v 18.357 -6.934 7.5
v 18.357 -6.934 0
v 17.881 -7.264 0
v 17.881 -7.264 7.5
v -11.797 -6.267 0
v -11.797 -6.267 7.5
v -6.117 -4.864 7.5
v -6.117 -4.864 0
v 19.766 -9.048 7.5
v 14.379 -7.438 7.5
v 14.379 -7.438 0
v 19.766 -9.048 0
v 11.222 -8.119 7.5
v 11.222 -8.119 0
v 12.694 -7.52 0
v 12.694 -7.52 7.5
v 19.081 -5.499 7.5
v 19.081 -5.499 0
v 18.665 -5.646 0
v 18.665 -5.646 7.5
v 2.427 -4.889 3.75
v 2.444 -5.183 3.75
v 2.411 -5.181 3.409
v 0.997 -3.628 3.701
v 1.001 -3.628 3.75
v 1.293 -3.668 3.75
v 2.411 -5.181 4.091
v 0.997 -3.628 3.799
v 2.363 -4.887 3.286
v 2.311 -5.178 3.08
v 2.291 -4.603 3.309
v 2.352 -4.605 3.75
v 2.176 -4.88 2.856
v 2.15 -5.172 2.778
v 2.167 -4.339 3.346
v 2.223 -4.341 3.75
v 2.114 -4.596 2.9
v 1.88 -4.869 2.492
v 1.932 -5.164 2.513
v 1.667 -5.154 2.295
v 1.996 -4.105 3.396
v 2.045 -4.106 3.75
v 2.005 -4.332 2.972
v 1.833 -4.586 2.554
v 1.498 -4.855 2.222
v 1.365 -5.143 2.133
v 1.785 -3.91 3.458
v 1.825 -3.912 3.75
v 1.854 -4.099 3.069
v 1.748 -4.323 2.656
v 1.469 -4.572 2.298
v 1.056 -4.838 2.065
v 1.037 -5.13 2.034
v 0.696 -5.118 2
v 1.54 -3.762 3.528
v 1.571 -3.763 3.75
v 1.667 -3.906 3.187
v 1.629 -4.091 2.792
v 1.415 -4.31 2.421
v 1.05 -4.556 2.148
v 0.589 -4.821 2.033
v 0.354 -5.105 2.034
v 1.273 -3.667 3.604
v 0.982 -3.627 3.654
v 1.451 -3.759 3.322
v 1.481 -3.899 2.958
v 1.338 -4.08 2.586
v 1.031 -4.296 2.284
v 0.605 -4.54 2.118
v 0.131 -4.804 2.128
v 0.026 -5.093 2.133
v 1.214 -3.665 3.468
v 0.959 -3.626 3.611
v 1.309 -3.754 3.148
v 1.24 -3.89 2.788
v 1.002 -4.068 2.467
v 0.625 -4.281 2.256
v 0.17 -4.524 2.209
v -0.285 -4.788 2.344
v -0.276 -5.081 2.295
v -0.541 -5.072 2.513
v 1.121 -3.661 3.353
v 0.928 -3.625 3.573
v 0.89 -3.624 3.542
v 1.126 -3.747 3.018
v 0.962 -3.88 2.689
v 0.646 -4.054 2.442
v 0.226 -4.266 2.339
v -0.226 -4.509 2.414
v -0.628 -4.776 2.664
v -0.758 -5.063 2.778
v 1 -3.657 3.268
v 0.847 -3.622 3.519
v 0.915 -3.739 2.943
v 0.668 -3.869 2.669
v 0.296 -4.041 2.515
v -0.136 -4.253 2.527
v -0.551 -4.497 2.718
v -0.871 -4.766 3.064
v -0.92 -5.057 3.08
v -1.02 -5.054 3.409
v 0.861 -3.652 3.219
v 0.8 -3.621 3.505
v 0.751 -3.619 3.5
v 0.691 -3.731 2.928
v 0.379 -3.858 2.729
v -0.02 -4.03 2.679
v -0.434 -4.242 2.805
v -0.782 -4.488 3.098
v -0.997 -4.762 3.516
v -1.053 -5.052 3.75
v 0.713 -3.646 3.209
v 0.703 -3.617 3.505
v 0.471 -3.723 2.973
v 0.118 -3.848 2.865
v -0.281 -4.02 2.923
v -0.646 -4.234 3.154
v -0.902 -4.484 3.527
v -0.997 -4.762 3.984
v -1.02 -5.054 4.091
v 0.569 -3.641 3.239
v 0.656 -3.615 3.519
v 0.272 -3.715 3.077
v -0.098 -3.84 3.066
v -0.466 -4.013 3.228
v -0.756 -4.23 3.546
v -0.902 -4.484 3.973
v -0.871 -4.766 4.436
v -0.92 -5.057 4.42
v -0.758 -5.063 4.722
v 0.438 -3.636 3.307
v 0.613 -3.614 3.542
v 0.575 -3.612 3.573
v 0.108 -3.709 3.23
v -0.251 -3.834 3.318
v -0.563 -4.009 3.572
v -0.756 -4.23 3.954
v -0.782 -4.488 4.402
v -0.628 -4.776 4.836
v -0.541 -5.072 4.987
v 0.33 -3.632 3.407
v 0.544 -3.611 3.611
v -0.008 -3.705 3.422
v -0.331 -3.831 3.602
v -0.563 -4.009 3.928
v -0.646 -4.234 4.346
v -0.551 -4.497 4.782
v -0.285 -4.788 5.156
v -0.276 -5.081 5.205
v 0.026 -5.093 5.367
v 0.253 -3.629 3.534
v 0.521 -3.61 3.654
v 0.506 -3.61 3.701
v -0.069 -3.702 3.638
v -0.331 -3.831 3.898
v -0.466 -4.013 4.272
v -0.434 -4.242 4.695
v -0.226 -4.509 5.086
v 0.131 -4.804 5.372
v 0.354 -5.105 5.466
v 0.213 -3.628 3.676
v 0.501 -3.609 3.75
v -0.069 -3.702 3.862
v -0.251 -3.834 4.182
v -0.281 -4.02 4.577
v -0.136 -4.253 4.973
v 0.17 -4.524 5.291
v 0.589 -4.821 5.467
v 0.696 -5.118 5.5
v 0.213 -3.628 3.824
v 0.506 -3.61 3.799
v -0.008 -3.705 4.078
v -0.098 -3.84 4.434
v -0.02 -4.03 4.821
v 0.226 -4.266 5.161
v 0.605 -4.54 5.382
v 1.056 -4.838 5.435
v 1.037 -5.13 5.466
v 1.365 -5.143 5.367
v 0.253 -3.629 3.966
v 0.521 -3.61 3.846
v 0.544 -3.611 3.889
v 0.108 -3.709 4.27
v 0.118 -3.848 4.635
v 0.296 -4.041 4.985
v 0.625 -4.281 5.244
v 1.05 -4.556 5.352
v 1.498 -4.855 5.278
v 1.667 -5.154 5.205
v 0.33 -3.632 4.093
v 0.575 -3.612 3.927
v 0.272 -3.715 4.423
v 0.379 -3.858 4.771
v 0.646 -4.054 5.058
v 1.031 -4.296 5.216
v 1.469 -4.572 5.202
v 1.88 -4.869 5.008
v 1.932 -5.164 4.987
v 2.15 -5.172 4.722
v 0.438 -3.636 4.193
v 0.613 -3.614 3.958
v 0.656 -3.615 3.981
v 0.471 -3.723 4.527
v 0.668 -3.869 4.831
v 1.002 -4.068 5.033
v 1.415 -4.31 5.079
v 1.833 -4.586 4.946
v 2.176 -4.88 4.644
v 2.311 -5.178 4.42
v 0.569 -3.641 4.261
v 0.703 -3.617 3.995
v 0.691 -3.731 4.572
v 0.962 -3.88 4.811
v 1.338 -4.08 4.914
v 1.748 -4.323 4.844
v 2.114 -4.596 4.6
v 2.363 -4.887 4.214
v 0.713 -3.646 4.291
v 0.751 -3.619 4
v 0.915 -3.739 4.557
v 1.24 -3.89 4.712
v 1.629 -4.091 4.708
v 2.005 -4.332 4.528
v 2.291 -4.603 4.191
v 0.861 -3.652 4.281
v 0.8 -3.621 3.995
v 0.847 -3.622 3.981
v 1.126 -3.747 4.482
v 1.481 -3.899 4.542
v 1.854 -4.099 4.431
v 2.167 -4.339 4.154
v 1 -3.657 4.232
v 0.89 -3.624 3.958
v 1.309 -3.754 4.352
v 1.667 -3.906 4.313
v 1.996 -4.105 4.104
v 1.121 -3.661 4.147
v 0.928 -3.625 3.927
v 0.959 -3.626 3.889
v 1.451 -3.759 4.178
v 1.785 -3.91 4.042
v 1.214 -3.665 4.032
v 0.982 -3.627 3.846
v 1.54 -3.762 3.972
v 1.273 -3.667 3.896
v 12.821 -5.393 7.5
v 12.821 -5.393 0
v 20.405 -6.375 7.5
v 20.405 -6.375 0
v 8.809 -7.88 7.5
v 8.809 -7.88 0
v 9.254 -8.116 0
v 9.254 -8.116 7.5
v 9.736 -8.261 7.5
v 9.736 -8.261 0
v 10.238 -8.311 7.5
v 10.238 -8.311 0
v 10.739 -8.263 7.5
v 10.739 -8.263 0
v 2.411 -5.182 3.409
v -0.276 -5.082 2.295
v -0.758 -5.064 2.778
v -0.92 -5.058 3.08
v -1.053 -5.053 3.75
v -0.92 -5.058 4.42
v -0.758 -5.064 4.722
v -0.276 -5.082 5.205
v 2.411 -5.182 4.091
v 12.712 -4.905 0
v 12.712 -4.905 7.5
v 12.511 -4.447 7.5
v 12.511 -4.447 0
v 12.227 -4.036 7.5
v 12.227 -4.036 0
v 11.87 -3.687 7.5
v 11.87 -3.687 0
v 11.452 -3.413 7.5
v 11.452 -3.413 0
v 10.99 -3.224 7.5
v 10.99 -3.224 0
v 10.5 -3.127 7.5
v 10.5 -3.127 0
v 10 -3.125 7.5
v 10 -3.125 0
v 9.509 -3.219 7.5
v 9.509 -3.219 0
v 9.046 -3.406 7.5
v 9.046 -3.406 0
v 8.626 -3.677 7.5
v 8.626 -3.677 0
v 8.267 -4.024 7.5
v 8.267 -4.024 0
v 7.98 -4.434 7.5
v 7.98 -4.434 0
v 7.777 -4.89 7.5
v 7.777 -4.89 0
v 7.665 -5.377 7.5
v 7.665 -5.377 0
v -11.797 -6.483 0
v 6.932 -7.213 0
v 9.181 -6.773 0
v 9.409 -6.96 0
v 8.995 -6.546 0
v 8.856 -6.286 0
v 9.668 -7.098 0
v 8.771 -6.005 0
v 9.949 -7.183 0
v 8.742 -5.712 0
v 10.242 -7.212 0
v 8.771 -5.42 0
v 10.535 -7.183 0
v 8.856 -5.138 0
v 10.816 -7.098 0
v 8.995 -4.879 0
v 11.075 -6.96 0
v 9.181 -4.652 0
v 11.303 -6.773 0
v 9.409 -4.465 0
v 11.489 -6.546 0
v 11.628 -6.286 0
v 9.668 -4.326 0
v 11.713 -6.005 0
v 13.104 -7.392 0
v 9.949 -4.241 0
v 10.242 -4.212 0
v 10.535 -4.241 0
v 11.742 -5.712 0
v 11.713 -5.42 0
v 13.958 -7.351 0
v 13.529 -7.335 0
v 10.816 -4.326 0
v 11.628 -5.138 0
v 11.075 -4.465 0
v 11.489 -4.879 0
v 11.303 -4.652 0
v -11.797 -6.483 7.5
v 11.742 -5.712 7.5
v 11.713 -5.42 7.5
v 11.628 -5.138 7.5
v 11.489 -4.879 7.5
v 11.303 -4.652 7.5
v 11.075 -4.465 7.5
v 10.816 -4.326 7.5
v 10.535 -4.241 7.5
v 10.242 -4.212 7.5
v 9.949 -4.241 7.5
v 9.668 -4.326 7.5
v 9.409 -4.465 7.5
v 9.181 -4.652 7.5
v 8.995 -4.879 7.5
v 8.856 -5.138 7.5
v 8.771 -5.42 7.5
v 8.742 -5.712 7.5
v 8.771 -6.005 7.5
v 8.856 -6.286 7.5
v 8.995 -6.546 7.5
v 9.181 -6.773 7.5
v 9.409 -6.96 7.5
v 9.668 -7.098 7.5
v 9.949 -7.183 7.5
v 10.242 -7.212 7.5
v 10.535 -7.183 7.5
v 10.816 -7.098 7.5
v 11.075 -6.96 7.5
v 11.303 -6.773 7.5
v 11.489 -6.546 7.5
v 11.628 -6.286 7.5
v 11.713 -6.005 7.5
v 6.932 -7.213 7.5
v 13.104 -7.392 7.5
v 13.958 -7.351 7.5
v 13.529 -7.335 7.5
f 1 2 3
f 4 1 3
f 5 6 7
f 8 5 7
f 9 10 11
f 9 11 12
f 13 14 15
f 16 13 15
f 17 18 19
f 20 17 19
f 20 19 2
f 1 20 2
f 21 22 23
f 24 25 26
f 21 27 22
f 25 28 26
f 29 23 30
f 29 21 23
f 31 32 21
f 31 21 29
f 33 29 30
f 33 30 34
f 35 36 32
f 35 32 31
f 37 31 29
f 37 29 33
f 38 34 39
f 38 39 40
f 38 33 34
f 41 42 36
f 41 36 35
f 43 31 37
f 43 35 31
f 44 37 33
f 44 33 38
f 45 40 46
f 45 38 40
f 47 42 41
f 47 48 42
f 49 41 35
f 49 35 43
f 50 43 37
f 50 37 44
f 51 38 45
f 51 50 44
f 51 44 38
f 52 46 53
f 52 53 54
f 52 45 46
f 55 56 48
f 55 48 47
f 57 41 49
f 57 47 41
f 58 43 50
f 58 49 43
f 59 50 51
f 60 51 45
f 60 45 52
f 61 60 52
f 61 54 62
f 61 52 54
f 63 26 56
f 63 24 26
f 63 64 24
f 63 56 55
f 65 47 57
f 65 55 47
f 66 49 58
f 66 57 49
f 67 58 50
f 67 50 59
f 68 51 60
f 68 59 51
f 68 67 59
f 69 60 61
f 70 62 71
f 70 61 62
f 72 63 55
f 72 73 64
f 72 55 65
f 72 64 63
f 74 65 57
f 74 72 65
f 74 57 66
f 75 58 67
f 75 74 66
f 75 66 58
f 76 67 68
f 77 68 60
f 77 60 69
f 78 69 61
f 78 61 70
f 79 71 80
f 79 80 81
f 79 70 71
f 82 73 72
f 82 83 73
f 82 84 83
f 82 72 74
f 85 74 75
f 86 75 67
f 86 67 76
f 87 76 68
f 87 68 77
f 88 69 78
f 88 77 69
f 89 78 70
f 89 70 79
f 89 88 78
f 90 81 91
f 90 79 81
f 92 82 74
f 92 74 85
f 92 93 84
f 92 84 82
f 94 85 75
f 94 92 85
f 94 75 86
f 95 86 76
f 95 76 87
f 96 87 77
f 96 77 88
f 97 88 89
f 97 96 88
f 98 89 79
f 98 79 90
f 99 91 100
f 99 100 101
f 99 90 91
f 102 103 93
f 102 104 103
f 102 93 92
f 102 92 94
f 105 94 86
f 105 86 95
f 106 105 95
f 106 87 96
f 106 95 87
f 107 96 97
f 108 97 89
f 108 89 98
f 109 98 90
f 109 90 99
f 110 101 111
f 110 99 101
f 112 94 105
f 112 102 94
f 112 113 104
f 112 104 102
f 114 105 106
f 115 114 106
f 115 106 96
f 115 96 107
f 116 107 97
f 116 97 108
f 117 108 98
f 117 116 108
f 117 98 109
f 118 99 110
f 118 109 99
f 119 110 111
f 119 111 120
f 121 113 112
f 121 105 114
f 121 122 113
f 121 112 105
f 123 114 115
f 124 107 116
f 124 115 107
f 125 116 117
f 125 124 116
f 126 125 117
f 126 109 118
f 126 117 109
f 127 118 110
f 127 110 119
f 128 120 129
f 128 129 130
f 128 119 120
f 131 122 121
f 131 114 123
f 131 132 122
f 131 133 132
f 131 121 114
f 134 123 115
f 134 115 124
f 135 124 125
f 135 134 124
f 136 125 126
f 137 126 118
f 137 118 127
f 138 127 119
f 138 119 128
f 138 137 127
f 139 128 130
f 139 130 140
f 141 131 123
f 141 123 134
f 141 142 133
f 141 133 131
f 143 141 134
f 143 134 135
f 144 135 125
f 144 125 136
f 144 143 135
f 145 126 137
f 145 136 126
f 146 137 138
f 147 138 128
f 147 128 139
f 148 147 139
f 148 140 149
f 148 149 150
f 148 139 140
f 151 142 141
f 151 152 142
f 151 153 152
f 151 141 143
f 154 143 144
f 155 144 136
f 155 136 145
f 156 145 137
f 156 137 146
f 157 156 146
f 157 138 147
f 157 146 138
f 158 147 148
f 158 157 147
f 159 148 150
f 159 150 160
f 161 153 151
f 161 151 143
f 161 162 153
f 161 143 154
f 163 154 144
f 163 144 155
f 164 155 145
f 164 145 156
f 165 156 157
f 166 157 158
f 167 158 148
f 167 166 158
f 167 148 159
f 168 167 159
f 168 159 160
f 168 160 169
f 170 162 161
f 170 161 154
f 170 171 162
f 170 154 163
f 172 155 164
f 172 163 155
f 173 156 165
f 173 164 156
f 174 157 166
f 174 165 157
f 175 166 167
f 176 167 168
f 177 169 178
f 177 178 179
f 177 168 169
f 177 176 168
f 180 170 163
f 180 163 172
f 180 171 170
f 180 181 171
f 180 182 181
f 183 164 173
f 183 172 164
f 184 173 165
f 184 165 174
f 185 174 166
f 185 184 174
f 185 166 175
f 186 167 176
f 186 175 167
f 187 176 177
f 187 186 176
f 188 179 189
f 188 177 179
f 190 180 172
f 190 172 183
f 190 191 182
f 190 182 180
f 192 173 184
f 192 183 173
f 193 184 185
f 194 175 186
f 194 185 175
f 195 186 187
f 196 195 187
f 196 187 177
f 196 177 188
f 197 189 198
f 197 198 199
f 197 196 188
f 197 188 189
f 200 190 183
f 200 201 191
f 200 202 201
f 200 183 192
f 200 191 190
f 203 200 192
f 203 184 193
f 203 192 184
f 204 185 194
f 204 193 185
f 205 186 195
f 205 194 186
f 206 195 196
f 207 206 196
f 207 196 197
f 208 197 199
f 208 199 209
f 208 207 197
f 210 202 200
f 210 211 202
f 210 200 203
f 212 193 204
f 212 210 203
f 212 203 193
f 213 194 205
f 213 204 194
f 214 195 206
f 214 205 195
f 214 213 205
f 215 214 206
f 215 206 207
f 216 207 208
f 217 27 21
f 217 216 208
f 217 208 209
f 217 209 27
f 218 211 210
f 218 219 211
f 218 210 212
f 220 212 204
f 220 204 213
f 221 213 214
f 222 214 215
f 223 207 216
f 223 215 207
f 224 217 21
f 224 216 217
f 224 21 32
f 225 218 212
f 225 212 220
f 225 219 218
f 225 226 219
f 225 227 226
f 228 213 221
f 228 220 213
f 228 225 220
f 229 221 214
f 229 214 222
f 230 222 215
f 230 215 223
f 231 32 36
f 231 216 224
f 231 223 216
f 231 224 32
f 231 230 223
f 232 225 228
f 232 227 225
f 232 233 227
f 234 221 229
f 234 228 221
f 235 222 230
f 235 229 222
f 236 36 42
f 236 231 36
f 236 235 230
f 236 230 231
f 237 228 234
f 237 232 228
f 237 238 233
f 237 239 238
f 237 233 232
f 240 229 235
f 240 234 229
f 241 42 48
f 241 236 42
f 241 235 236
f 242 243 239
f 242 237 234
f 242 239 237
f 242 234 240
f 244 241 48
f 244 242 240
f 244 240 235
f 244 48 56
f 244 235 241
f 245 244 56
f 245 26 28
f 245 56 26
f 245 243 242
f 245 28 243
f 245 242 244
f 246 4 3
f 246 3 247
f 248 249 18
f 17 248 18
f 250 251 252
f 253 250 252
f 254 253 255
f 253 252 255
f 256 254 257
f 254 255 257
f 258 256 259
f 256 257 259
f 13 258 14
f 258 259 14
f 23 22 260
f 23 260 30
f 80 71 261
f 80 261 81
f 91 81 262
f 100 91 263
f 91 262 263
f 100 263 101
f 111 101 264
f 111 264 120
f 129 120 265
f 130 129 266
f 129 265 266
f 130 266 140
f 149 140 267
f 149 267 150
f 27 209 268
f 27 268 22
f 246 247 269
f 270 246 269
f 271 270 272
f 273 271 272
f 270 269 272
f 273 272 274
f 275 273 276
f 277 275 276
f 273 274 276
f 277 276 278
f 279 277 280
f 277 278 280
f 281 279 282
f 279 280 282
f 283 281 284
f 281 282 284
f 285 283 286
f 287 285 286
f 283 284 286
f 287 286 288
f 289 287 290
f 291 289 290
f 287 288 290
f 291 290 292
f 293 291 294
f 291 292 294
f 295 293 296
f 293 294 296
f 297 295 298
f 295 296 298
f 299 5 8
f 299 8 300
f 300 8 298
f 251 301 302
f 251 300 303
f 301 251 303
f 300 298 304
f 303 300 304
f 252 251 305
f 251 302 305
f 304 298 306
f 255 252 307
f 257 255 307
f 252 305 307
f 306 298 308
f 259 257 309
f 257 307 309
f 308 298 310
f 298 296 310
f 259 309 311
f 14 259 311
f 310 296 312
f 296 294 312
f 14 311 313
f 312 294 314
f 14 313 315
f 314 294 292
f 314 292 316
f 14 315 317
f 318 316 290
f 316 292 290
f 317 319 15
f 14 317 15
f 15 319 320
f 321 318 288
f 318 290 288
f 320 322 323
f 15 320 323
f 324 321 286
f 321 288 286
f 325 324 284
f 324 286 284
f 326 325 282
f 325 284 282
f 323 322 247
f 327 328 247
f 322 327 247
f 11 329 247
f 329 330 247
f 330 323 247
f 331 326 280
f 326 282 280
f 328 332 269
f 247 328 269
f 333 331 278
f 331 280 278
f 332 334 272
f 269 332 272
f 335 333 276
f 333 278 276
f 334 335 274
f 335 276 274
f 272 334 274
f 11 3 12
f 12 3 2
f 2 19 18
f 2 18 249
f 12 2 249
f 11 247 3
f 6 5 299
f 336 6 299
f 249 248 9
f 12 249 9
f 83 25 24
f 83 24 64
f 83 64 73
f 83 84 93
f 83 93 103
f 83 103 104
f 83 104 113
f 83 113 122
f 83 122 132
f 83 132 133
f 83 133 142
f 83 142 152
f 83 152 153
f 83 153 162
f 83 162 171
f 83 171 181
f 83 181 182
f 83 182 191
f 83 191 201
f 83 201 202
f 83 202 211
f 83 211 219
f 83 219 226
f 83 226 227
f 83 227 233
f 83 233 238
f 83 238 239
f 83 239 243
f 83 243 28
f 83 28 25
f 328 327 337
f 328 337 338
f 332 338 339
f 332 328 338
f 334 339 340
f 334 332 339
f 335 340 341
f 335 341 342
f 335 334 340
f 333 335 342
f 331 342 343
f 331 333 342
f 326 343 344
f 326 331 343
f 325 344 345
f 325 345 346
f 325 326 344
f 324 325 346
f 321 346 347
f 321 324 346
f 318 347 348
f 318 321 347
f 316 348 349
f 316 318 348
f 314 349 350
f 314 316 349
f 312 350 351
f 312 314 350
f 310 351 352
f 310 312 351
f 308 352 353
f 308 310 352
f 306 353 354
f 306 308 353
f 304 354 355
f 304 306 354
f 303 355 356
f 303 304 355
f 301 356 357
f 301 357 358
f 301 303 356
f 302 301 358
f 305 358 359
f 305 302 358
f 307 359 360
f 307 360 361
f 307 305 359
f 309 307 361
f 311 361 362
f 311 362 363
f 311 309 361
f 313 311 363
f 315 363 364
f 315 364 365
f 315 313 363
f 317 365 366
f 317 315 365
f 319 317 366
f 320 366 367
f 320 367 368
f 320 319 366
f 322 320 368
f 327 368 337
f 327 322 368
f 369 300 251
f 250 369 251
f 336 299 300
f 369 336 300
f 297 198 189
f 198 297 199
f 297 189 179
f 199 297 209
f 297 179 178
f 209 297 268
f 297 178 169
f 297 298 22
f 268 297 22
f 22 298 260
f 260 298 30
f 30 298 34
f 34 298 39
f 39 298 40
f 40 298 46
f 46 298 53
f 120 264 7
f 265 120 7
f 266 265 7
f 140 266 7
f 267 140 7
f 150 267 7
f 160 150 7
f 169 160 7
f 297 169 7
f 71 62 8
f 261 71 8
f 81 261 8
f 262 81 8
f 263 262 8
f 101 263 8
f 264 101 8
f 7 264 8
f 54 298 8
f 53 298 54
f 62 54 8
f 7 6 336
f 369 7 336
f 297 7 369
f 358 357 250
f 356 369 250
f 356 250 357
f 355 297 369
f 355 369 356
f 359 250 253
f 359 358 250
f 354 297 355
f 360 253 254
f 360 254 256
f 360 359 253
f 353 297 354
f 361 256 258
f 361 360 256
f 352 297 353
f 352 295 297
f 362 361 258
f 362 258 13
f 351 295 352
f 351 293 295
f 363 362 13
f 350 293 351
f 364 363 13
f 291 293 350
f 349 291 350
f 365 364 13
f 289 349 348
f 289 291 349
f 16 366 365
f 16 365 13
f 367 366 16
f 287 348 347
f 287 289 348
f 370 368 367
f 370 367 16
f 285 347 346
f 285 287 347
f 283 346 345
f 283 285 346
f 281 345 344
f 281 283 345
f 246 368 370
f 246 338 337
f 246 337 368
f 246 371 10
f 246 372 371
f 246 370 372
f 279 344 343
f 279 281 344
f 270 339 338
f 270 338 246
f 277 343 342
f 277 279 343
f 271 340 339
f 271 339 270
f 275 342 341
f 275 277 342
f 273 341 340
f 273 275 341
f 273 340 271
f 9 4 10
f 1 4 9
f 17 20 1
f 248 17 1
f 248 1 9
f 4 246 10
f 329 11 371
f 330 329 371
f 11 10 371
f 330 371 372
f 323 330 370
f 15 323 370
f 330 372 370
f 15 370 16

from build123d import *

# Parameters (mm, degrees)
SKETCH1_R           = 1.5
BOSS_EXTRUDE1_DEPTH = 7.5
FILLET1_R           = 2.54
CHAMFER2_SIZE       = 2.665692085
CHAMFER2_SIZE_2     = 5
SKETCH4_R           = 1.75
BOSS_EXTRUDE2_DEPTH = 1.5
FILLET2_R           = 1.500000048
CUT_EXTRUDE1_DEPTH  = 7.5


# Some blends are built 0.0001 mm under size
with BuildPart() as part:
    # Sketch1 → Boss-Extrude1 (new body)
    with BuildSketch(Plane.XY):
        with BuildLine():
            Line((17.881226168, -7.264400992), (12.820526555, -5.392684832))
            ThreePointArc((12.820526555, -5.392684832), (10.249738142, -3.113969145), (7.665252761, -5.377138064))
            Line((7.665252761, -5.377138064), (-11.113294597, -4.678112359))
            Line((-11.113294597, -4.678112359), (-11.797383791, -5.362201553))
            Line((-11.797383791, -5.362201553), (-11.797383791, -6.482688956))
            Line((-11.797383791, -6.482688956), (6.932172042, -7.212884314))
            Line((6.932172042, -7.212884314), (8.80911881, -7.87994093))
            ThreePointArc((8.80911881, -7.87994093), (9.985840847, -8.298026499), (11.221708583, -8.118858325))
            Line((11.221708583, -8.118858325), (13.521910205, -7.18234795))
            Line((13.521910205, -7.18234795), (20.245554573, -9.191065966))
            Line((20.245554573, -9.191065966), (20.849339495, -6.668640767))
            Line((20.849339495, -6.668640767), (19.081317898, -5.499046666))
            Line((19.081317898, -5.499046666), (18.665024161, -5.64566597))
            Line((18.665024161, -5.64566597), (18.356685028, -6.933810758))
            Line((18.356685028, -6.933810758), (17.881226168, -7.264400992))
        make_face()
        with Locations((10.241902304, -5.712315853)):
            Circle(SKETCH1_R, mode=Mode.SUBTRACT)
    extrude(amount=BOSS_EXTRUDE1_DEPTH)

    # Fillet1
    fillet1_edges = [part.edges().sort_by_distance(p)[0] for p in [
        (13.521910205, -7.18234795, 3.75),
    ]]
    fillet(fillet1_edges, radius=FILLET1_R)

    # Chamfer2
    # the kernel refuses this chamfer: 5, 2.665692085 mm, written as the material it takes off along each edge
    with BuildSketch(Plane(origin=(-11.113294597, -4.678112359, -12.981362455), x_dir=(-0.7323937898878367, -0.6808812940107337, 0), z_dir=(0, 0, 1))) as chamfer2_piece_1:
        Polygon((CHAMFER2_SIZE * 0.999336395545, CHAMFER2_SIZE * 0.0364248351519), (-CHAMFER2_SIZE_2 * 0.706558829098, CHAMFER2_SIZE_2 * 0.707654308984), (0, 0), align=None)
    extrude(amount=33.462724911, mode=Mode.SUBTRACT)

    # Sketch4 → Boss-Extrude2 (add)
    with BuildSketch(Plane(origin=(-0.189278476, -5.084755532, 0), x_dir=(0.9993078802351368, -0.03719893143569399, 0), z_dir=(0.03719893143569399, 0.9993078802351368, 0))):
        with Locations((0.885514773, -3.75)):
            Circle(SKETCH4_R)
    extrude(amount=BOSS_EXTRUDE2_DEPTH)

    # Fillet2
    fillet2_edges = [part.edges().sort_by_distance(p)[0] for p in [
        (-0.997366978, -3.553635785, 3.75),
    ]]
    fillet(fillet2_edges, radius=FILLET2_R - 0.0001)  # a hair under: the kernel refuses the full size

    # Sketch5 → Cut-Extrude1 (cut)
    with BuildSketch(Plane.XY.offset(7.5)):
        Polygon((20.405496385, -6.375026546), (19.765742241, -9.047719944), (20.245554573, -9.191065966), (20.849339495, -6.668640767), align=None)
    extrude(amount=-CUT_EXTRUDE1_DEPTH, mode=Mode.SUBTRACT)


solid = part.part
